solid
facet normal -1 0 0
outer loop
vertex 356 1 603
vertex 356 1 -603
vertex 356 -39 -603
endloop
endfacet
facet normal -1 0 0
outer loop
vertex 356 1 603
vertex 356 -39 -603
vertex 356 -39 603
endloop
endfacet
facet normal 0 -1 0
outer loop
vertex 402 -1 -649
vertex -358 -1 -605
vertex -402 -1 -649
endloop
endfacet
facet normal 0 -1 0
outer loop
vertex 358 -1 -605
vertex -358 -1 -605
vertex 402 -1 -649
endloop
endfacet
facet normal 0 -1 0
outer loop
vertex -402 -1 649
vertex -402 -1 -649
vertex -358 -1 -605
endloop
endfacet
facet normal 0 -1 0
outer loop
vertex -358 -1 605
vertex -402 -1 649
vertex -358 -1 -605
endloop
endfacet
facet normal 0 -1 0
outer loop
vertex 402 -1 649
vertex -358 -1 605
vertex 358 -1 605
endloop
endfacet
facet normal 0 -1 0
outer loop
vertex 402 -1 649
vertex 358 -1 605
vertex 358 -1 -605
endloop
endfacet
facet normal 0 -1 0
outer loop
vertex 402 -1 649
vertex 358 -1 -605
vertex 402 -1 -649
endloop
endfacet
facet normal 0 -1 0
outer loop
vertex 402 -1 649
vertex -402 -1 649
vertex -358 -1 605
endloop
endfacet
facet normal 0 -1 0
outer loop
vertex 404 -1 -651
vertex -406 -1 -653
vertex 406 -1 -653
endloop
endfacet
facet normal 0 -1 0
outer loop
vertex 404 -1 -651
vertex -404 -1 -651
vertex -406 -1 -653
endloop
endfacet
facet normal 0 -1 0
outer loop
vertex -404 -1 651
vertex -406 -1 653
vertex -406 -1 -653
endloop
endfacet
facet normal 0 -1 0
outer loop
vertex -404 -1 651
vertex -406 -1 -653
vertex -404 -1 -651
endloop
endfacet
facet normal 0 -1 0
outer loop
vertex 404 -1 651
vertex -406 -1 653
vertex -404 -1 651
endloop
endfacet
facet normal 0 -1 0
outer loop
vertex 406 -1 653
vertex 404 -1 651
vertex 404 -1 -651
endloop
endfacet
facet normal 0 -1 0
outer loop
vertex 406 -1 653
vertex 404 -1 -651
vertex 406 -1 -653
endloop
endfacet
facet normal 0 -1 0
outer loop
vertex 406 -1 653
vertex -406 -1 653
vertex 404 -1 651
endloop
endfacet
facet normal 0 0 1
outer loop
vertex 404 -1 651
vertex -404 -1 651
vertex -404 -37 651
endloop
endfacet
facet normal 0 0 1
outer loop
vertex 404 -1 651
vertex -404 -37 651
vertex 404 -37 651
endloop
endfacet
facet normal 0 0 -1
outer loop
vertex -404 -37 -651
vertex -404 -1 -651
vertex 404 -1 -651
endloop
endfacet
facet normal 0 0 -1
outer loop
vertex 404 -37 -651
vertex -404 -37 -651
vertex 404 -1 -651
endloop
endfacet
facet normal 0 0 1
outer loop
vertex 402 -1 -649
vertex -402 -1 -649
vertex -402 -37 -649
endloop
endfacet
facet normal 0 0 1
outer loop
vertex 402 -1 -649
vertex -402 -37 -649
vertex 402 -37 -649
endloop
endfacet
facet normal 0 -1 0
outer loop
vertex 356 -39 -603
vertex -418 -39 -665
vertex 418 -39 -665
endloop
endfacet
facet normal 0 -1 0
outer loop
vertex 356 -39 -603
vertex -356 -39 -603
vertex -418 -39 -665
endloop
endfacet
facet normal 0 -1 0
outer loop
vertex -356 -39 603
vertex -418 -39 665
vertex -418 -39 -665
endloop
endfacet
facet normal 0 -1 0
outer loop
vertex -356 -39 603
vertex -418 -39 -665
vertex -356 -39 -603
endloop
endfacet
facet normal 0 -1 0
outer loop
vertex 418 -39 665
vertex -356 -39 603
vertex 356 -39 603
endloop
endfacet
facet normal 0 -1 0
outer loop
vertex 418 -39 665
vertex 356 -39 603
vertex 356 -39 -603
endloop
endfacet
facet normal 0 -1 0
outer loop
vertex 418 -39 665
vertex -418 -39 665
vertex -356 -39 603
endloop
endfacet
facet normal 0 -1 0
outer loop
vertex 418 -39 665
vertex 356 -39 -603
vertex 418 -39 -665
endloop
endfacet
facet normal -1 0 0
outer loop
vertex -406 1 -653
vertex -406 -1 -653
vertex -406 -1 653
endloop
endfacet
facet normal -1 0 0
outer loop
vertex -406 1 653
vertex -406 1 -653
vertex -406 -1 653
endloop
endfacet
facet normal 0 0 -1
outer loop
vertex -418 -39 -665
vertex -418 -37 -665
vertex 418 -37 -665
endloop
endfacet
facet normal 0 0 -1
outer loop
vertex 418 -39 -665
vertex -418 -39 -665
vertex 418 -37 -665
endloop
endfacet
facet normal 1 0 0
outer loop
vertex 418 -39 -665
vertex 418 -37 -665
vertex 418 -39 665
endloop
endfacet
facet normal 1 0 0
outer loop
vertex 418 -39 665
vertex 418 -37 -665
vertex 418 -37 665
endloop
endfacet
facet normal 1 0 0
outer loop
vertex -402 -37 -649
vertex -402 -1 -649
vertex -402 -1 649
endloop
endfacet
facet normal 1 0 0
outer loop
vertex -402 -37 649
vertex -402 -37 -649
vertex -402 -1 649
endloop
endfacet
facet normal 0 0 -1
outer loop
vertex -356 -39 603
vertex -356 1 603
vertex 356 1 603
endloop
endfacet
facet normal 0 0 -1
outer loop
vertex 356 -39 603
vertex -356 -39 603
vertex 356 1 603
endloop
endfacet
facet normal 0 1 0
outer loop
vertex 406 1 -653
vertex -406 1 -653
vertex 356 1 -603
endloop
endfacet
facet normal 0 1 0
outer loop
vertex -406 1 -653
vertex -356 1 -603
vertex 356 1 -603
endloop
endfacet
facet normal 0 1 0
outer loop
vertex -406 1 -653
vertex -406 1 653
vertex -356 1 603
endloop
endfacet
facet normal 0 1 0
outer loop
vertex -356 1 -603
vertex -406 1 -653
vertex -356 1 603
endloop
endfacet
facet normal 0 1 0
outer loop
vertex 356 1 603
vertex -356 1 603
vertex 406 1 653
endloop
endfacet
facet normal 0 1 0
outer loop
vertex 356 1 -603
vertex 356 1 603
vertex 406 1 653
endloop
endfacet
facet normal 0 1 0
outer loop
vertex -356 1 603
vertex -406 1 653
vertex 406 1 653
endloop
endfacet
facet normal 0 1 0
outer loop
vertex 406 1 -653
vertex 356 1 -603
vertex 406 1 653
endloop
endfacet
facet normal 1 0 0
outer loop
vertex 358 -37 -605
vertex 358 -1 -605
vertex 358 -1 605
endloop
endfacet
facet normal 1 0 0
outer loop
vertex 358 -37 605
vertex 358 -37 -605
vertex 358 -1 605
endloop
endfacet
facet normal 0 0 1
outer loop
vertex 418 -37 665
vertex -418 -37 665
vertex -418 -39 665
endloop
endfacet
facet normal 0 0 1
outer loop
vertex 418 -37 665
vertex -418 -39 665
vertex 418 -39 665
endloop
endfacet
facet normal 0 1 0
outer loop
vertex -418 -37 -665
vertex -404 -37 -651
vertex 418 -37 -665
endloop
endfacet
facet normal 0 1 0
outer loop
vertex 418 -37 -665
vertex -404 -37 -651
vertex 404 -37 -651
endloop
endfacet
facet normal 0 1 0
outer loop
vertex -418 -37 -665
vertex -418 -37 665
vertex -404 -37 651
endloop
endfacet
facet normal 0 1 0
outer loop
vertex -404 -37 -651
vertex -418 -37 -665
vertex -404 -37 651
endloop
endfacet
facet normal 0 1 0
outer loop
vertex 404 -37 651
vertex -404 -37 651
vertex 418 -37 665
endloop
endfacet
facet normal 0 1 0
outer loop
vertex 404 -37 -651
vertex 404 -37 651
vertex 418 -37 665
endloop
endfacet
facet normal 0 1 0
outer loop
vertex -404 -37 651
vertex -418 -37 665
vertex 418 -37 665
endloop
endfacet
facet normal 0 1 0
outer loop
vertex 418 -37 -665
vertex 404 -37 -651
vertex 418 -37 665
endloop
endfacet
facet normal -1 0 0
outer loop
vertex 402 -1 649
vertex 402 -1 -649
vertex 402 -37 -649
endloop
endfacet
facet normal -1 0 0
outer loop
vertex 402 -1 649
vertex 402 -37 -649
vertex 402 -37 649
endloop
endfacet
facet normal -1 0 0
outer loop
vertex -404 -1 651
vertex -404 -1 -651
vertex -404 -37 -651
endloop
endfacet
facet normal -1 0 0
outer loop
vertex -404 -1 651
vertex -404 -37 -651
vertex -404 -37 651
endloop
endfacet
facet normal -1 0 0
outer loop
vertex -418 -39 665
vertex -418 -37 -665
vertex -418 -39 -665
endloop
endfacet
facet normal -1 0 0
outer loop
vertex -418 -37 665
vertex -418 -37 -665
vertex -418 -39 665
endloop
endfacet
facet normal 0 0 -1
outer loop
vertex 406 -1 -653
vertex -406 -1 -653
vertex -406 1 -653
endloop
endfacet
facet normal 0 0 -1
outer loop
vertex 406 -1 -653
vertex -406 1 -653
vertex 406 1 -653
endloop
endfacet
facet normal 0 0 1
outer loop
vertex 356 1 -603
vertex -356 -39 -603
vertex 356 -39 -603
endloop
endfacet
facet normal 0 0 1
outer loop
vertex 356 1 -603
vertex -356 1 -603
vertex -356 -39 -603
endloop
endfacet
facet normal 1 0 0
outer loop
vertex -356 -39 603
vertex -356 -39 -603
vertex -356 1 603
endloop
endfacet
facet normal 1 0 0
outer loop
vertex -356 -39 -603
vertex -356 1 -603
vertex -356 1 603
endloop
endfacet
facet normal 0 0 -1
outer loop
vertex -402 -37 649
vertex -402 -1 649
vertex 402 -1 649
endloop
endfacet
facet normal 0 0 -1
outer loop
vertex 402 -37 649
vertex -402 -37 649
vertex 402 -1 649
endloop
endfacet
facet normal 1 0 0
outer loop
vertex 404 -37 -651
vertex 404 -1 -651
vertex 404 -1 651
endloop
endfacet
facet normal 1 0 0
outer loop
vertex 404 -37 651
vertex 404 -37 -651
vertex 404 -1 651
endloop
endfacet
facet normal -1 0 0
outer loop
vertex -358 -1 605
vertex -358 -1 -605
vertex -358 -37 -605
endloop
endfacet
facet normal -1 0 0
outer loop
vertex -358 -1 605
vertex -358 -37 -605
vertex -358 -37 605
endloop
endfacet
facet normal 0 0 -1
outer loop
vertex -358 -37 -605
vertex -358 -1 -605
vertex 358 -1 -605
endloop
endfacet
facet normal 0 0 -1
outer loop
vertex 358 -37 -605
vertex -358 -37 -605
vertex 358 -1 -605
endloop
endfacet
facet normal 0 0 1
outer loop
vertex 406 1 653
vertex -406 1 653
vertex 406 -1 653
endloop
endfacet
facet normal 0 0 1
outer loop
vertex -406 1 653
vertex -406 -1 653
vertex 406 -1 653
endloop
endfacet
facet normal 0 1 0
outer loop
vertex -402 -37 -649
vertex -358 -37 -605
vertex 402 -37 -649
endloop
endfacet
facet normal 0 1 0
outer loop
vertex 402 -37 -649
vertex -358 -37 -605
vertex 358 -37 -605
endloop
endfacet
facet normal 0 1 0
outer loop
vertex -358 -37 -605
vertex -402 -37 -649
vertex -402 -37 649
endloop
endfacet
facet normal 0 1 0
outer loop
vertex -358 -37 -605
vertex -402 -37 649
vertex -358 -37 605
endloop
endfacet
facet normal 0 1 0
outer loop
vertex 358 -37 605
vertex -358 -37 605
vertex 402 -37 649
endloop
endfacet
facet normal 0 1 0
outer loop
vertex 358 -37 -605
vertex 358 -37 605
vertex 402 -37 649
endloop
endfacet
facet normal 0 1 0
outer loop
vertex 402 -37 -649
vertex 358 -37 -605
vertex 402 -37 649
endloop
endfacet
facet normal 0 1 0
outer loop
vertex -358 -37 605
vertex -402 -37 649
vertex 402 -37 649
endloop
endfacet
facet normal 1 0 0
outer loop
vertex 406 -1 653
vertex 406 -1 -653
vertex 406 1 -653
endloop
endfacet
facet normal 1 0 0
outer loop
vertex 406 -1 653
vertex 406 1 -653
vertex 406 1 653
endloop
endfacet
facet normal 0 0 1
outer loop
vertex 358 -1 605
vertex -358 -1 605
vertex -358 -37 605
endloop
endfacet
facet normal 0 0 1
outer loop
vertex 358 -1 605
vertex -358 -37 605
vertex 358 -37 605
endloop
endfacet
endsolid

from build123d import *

# Parameters (mm, degrees)
F0_W     = 812
F0_H     = 1306
F0_W_2   = 712
F0_H_2   = 1206
F1_DEPTH = 1
F2_W     = 808
F2_H     = 1302
F2_W_2   = 804
F2_H_2   = 1298
F2_W_3   = 716
F2_H_3   = 1210
F2_W_4   = 712
F2_H_4   = 1206
F3_DEPTH = 36
F4_W     = 836
F4_H     = 1330
F4_W_2   = 712
F4_H_2   = 1206
F5_DEPTH = 2


with BuildPart() as f1:
    # F0 (on Front) → F1 (new body, symmetric)
    with BuildSketch(Plane.XZ):
        Rectangle(F0_W, F0_H)
        Rectangle(F0_W_2, F0_H_2, mode=Mode.SUBTRACT)
    extrude(amount=F1_DEPTH, both=True)

    # F2 (on face) → F3 (join)
    with BuildSketch(Plane.XZ.offset(1)):
        Rectangle(F2_W, F2_H)
        Rectangle(F2_W_2, F2_H_2, mode=Mode.SUBTRACT)
        Rectangle(F2_W_3, F2_H_3)
        Rectangle(F2_W_4, F2_H_4, mode=Mode.SUBTRACT)
    extrude(amount=F3_DEPTH)

    # F4 (on face) → F5 (join)
    with BuildSketch(Plane.XZ.offset(37)):
        Rectangle(F4_W, F4_H)
        Rectangle(F4_W_2, F4_H_2, mode=Mode.SUBTRACT)
    extrude(amount=F5_DEPTH)


solid = f1.part
